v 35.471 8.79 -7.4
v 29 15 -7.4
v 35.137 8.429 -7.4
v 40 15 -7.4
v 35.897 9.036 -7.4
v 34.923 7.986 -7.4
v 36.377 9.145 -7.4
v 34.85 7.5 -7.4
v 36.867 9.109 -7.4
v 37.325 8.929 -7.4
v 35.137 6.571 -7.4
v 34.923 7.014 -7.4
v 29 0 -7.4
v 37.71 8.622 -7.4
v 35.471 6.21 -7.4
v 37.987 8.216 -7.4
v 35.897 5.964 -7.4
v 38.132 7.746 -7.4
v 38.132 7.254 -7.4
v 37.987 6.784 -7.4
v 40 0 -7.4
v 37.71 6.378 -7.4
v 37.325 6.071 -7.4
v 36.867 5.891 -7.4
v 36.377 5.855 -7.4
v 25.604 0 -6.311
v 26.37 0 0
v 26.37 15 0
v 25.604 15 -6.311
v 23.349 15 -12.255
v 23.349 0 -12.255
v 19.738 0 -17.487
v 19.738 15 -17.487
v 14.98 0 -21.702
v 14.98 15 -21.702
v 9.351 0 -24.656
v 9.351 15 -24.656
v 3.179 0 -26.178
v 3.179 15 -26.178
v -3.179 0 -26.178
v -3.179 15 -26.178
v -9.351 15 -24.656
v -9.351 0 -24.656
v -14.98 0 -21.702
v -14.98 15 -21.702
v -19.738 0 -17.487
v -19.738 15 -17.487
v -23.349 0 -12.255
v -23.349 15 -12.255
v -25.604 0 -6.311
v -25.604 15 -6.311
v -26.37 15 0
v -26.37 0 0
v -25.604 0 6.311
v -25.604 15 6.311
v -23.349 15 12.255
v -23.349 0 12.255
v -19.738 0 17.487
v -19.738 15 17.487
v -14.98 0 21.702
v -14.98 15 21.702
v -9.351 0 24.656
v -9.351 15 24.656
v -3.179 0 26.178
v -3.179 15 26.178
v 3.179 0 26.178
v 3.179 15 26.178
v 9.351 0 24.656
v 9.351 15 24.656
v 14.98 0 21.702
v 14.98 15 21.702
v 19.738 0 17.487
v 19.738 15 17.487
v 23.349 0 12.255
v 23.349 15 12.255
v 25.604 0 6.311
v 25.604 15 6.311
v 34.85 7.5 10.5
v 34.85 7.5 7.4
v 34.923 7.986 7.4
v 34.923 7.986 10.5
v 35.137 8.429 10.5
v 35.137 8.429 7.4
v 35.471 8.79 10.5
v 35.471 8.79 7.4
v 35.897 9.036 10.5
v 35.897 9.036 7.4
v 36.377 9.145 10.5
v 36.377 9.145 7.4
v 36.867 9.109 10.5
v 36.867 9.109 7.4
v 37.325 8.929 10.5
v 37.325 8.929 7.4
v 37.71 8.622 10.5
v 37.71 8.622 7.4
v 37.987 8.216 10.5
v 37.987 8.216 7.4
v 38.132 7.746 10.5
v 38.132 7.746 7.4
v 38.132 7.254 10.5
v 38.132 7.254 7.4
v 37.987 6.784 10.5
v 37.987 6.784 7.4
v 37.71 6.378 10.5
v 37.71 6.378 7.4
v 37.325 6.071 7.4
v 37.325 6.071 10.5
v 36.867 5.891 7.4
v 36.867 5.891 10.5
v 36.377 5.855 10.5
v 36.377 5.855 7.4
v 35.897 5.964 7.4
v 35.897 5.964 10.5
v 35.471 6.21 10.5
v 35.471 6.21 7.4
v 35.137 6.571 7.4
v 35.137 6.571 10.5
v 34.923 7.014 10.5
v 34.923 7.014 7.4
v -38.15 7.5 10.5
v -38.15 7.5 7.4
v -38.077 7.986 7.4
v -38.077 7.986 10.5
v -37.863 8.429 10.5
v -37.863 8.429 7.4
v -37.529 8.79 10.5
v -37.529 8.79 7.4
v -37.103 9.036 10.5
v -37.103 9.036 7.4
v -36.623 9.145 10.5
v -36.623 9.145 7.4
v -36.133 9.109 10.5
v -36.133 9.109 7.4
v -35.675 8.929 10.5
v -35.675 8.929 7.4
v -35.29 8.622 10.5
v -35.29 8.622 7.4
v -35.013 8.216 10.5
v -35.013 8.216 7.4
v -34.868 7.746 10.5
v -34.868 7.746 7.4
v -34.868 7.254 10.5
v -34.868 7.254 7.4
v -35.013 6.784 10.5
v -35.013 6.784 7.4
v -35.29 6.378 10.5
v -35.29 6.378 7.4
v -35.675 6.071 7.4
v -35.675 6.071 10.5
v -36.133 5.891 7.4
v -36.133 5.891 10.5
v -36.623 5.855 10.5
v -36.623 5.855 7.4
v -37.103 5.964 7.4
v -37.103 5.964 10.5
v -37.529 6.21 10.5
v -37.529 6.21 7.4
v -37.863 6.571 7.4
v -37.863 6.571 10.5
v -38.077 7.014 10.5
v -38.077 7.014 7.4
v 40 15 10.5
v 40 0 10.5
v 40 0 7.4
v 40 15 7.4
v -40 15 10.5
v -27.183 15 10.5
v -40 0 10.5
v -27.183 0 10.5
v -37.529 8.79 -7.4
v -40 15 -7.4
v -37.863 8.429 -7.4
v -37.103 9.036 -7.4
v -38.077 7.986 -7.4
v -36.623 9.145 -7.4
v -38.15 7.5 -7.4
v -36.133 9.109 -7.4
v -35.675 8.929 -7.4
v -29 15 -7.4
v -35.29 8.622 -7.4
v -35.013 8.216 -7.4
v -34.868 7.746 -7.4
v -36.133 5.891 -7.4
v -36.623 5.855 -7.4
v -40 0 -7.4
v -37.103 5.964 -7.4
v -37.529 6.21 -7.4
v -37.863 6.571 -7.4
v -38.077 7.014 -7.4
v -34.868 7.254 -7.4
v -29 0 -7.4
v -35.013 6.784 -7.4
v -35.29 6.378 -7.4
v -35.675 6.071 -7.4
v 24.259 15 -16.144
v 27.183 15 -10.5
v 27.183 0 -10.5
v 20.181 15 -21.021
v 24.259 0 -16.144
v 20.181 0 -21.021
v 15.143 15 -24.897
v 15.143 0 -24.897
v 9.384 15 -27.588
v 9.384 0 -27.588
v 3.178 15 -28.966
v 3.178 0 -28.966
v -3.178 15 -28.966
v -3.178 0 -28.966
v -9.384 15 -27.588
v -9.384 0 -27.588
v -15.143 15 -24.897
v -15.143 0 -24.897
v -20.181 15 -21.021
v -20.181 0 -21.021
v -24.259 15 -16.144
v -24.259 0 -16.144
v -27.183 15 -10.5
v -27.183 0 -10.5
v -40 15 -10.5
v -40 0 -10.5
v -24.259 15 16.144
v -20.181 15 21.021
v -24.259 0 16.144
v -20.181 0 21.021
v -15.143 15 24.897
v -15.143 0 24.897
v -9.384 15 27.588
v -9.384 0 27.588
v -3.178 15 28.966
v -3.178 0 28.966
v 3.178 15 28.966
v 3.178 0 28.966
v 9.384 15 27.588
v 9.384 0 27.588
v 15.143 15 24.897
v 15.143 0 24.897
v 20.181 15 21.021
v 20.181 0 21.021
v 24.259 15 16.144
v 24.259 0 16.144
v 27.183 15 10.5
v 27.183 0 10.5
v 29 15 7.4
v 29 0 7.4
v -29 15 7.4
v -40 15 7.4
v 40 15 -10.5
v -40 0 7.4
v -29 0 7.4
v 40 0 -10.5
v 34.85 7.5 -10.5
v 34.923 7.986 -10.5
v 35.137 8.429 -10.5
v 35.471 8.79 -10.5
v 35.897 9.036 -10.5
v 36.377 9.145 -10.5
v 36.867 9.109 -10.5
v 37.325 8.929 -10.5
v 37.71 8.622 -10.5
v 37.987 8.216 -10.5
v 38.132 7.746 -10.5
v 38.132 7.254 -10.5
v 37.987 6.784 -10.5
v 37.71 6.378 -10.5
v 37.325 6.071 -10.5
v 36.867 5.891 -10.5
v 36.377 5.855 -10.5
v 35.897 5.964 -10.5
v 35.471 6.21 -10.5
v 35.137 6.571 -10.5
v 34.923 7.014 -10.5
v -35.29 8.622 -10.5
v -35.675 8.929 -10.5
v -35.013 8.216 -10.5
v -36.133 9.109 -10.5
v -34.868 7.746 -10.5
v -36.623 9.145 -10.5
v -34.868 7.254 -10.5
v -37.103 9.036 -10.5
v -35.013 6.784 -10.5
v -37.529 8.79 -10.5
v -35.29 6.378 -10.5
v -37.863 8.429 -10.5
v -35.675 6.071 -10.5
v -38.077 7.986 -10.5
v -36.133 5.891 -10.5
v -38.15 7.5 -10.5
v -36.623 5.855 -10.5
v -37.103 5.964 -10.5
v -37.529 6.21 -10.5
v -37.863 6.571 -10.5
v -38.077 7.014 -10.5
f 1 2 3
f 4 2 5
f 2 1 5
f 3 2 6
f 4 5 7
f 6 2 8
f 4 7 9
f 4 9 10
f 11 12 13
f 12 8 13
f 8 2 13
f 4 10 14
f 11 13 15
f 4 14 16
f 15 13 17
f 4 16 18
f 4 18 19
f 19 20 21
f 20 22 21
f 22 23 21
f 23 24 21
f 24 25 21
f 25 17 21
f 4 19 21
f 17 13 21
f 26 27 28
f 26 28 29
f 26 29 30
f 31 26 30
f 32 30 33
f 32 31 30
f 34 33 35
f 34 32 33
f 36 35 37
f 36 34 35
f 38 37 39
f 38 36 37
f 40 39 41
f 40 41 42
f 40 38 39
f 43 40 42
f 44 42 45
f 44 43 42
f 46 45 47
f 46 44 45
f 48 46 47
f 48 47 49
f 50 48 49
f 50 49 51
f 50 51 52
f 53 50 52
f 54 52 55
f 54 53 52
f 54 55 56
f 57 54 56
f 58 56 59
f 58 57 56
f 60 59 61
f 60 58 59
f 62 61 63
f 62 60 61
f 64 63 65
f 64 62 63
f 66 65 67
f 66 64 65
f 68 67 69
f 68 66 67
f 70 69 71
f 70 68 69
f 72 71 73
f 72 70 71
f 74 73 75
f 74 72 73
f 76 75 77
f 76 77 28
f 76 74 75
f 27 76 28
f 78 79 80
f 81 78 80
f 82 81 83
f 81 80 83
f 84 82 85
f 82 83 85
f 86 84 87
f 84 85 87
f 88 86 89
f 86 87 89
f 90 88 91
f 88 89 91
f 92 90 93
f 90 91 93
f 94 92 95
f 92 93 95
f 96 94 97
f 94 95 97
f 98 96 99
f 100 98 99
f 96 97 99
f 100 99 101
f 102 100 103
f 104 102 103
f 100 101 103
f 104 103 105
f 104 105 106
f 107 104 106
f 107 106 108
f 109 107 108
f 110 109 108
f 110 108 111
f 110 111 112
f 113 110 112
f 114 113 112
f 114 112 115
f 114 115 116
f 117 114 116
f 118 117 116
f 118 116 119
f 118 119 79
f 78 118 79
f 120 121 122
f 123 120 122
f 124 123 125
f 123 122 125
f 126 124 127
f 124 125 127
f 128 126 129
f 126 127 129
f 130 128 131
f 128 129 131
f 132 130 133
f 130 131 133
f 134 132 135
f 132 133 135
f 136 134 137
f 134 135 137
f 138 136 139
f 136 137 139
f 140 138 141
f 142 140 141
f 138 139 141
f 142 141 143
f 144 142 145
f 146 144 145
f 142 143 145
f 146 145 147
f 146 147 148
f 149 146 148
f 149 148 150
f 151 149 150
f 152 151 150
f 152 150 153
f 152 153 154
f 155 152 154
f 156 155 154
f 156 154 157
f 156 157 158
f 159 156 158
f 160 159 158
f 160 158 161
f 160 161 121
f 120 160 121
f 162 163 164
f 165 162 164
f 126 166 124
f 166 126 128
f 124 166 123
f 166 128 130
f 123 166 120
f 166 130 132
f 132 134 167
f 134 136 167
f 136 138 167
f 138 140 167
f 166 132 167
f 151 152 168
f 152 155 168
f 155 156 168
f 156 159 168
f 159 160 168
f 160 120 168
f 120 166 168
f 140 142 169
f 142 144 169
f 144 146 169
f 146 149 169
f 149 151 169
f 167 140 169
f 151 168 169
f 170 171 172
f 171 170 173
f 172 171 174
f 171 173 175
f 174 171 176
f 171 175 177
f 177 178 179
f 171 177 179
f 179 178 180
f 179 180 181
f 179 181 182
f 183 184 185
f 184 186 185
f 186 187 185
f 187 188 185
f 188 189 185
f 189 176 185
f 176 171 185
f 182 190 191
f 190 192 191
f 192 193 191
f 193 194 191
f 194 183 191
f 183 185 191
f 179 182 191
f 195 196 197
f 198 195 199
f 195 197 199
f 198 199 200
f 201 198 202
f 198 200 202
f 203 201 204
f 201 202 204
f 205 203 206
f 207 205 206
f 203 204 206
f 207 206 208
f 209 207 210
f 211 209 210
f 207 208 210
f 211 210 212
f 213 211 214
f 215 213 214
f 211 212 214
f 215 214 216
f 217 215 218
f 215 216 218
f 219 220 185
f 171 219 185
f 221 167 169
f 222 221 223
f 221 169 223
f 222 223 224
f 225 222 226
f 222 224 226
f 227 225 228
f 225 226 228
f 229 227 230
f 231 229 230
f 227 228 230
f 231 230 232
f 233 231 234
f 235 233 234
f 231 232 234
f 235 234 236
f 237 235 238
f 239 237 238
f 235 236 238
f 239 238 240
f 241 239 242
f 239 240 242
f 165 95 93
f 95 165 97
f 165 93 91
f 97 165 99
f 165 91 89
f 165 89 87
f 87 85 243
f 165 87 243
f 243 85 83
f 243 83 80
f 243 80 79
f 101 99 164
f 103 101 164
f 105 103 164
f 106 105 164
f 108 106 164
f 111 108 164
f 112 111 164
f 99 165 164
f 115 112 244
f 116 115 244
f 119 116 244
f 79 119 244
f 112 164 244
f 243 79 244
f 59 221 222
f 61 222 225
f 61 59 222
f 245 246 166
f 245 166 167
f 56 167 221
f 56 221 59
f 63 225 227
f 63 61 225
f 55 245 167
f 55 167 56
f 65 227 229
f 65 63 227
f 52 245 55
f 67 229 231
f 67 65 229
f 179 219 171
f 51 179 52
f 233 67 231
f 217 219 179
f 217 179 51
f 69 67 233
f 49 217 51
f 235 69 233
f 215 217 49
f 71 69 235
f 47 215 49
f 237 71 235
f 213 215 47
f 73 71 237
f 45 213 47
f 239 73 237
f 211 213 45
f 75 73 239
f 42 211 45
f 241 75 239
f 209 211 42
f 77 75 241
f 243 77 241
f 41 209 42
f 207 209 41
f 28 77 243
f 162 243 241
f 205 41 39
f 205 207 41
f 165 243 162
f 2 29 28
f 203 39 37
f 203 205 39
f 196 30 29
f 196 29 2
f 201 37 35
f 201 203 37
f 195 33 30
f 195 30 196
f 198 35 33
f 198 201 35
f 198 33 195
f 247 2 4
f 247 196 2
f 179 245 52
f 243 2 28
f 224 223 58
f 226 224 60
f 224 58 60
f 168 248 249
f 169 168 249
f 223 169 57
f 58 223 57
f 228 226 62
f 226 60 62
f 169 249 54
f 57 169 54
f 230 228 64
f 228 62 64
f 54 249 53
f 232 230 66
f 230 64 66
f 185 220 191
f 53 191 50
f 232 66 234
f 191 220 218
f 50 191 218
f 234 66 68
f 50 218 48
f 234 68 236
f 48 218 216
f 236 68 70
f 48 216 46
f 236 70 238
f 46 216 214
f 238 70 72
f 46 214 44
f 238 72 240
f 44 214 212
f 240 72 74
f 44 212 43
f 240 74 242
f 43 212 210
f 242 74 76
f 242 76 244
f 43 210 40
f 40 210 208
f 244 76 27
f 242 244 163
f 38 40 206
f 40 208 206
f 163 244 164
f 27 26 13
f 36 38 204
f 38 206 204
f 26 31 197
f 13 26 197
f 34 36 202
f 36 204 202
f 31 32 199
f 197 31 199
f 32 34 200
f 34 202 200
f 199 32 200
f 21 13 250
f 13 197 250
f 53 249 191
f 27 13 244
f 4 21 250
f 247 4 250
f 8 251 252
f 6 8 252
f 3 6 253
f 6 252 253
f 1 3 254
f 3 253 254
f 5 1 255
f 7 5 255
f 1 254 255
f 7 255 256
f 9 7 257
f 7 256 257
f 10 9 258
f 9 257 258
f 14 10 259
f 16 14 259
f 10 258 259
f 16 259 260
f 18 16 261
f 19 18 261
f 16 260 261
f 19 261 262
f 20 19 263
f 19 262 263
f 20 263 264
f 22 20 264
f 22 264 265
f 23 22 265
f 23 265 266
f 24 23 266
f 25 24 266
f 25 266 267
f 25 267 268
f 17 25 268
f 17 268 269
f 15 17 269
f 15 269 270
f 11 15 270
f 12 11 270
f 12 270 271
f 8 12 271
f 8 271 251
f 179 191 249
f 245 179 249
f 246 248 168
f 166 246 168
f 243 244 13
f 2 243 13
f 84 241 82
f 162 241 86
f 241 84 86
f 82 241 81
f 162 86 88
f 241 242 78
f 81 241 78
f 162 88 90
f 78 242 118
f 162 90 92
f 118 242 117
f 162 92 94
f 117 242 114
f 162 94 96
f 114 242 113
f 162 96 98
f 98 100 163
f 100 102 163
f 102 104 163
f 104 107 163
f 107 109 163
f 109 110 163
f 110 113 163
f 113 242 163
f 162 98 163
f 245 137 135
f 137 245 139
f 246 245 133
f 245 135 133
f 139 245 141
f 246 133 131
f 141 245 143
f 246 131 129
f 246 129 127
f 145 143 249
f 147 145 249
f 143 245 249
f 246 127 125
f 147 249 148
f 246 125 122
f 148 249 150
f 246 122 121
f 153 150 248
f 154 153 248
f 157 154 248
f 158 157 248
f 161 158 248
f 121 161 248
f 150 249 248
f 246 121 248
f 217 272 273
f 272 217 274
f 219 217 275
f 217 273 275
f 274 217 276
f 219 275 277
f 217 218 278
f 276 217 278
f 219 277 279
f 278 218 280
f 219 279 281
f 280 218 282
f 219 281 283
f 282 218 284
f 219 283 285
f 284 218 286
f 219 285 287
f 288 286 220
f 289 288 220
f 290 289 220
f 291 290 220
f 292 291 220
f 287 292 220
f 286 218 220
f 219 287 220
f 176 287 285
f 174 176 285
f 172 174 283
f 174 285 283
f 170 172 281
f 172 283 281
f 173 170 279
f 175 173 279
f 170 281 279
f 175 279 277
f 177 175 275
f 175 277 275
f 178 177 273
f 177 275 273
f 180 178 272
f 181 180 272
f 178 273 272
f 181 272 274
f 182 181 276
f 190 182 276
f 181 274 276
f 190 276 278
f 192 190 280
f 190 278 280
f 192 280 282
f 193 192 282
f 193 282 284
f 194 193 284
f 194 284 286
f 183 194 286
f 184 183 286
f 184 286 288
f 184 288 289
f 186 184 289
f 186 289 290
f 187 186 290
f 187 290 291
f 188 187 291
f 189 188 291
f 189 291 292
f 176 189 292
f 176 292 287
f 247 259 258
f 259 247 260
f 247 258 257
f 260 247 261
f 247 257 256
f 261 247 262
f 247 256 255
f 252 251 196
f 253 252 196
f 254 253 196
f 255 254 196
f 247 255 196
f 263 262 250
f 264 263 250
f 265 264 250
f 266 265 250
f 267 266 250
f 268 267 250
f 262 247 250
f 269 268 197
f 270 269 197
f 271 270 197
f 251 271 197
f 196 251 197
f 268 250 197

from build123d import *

# Parameters (mm, degrees)
SKETCH_1_R          = 26.37
EXTRUDE_1_DEPTH     = 15
SKETCH_2_R          = 1.65
CUT_EXTRUDE_1_DEPTH = 23


with BuildPart() as part:
    # 草图1 → 凸台-拉伸1 (new body)
    with BuildSketch(Plane(origin=(0, 0, 0), x_dir=(1, 0, 0), z_dir=(0, 1, 0))):
        with BuildLine():
            Line((-40, 7.4), (-29, 7.4))
            Line((-29, 7.4), (-29, -7.4))
            Line((-29, -7.4), (-40, -7.4))
            Line((-40, -7.4), (-40, -10.5))
            Line((-40, -10.5), (-27.182523797, -10.5))
            ThreePointArc((-27.182523797, -10.5), (0, -29.14), (27.182523797, -10.5))
            Line((27.182523797, -10.5), (40, -10.5))
            Line((40, -10.5), (40, -7.4))
            Line((40, -7.4), (29, -7.4))
            Line((29, -7.4), (29, 7.4))
            Line((29, 7.4), (40, 7.4))
            Line((40, 7.4), (40, 10.5))
            Line((40, 10.5), (27.182523797, 10.5))
            ThreePointArc((27.182523797, 10.5), (0, 29.14), (-27.182523797, 10.5))
            Line((-27.182523797, 10.5), (-40, 10.5))
            Line((-40, 10.5), (-40, 7.4))
        make_face()
        Circle(SKETCH_1_R, mode=Mode.SUBTRACT)
    extrude(amount=EXTRUDE_1_DEPTH)

    # 草图2 → 切除-拉伸1 (cut)
    with BuildSketch(Plane(origin=(0, 0, -10.5), x_dir=(-1, 0, 0), z_dir=(0, 0, -1))):
        with Locations((36.5, 7.5)):
            Circle(SKETCH_2_R)
        with Locations((-36.5, 7.5)):
            Circle(SKETCH_2_R)
    extrude(amount=-CUT_EXTRUDE_1_DEPTH, mode=Mode.SUBTRACT)


solid = part.part
